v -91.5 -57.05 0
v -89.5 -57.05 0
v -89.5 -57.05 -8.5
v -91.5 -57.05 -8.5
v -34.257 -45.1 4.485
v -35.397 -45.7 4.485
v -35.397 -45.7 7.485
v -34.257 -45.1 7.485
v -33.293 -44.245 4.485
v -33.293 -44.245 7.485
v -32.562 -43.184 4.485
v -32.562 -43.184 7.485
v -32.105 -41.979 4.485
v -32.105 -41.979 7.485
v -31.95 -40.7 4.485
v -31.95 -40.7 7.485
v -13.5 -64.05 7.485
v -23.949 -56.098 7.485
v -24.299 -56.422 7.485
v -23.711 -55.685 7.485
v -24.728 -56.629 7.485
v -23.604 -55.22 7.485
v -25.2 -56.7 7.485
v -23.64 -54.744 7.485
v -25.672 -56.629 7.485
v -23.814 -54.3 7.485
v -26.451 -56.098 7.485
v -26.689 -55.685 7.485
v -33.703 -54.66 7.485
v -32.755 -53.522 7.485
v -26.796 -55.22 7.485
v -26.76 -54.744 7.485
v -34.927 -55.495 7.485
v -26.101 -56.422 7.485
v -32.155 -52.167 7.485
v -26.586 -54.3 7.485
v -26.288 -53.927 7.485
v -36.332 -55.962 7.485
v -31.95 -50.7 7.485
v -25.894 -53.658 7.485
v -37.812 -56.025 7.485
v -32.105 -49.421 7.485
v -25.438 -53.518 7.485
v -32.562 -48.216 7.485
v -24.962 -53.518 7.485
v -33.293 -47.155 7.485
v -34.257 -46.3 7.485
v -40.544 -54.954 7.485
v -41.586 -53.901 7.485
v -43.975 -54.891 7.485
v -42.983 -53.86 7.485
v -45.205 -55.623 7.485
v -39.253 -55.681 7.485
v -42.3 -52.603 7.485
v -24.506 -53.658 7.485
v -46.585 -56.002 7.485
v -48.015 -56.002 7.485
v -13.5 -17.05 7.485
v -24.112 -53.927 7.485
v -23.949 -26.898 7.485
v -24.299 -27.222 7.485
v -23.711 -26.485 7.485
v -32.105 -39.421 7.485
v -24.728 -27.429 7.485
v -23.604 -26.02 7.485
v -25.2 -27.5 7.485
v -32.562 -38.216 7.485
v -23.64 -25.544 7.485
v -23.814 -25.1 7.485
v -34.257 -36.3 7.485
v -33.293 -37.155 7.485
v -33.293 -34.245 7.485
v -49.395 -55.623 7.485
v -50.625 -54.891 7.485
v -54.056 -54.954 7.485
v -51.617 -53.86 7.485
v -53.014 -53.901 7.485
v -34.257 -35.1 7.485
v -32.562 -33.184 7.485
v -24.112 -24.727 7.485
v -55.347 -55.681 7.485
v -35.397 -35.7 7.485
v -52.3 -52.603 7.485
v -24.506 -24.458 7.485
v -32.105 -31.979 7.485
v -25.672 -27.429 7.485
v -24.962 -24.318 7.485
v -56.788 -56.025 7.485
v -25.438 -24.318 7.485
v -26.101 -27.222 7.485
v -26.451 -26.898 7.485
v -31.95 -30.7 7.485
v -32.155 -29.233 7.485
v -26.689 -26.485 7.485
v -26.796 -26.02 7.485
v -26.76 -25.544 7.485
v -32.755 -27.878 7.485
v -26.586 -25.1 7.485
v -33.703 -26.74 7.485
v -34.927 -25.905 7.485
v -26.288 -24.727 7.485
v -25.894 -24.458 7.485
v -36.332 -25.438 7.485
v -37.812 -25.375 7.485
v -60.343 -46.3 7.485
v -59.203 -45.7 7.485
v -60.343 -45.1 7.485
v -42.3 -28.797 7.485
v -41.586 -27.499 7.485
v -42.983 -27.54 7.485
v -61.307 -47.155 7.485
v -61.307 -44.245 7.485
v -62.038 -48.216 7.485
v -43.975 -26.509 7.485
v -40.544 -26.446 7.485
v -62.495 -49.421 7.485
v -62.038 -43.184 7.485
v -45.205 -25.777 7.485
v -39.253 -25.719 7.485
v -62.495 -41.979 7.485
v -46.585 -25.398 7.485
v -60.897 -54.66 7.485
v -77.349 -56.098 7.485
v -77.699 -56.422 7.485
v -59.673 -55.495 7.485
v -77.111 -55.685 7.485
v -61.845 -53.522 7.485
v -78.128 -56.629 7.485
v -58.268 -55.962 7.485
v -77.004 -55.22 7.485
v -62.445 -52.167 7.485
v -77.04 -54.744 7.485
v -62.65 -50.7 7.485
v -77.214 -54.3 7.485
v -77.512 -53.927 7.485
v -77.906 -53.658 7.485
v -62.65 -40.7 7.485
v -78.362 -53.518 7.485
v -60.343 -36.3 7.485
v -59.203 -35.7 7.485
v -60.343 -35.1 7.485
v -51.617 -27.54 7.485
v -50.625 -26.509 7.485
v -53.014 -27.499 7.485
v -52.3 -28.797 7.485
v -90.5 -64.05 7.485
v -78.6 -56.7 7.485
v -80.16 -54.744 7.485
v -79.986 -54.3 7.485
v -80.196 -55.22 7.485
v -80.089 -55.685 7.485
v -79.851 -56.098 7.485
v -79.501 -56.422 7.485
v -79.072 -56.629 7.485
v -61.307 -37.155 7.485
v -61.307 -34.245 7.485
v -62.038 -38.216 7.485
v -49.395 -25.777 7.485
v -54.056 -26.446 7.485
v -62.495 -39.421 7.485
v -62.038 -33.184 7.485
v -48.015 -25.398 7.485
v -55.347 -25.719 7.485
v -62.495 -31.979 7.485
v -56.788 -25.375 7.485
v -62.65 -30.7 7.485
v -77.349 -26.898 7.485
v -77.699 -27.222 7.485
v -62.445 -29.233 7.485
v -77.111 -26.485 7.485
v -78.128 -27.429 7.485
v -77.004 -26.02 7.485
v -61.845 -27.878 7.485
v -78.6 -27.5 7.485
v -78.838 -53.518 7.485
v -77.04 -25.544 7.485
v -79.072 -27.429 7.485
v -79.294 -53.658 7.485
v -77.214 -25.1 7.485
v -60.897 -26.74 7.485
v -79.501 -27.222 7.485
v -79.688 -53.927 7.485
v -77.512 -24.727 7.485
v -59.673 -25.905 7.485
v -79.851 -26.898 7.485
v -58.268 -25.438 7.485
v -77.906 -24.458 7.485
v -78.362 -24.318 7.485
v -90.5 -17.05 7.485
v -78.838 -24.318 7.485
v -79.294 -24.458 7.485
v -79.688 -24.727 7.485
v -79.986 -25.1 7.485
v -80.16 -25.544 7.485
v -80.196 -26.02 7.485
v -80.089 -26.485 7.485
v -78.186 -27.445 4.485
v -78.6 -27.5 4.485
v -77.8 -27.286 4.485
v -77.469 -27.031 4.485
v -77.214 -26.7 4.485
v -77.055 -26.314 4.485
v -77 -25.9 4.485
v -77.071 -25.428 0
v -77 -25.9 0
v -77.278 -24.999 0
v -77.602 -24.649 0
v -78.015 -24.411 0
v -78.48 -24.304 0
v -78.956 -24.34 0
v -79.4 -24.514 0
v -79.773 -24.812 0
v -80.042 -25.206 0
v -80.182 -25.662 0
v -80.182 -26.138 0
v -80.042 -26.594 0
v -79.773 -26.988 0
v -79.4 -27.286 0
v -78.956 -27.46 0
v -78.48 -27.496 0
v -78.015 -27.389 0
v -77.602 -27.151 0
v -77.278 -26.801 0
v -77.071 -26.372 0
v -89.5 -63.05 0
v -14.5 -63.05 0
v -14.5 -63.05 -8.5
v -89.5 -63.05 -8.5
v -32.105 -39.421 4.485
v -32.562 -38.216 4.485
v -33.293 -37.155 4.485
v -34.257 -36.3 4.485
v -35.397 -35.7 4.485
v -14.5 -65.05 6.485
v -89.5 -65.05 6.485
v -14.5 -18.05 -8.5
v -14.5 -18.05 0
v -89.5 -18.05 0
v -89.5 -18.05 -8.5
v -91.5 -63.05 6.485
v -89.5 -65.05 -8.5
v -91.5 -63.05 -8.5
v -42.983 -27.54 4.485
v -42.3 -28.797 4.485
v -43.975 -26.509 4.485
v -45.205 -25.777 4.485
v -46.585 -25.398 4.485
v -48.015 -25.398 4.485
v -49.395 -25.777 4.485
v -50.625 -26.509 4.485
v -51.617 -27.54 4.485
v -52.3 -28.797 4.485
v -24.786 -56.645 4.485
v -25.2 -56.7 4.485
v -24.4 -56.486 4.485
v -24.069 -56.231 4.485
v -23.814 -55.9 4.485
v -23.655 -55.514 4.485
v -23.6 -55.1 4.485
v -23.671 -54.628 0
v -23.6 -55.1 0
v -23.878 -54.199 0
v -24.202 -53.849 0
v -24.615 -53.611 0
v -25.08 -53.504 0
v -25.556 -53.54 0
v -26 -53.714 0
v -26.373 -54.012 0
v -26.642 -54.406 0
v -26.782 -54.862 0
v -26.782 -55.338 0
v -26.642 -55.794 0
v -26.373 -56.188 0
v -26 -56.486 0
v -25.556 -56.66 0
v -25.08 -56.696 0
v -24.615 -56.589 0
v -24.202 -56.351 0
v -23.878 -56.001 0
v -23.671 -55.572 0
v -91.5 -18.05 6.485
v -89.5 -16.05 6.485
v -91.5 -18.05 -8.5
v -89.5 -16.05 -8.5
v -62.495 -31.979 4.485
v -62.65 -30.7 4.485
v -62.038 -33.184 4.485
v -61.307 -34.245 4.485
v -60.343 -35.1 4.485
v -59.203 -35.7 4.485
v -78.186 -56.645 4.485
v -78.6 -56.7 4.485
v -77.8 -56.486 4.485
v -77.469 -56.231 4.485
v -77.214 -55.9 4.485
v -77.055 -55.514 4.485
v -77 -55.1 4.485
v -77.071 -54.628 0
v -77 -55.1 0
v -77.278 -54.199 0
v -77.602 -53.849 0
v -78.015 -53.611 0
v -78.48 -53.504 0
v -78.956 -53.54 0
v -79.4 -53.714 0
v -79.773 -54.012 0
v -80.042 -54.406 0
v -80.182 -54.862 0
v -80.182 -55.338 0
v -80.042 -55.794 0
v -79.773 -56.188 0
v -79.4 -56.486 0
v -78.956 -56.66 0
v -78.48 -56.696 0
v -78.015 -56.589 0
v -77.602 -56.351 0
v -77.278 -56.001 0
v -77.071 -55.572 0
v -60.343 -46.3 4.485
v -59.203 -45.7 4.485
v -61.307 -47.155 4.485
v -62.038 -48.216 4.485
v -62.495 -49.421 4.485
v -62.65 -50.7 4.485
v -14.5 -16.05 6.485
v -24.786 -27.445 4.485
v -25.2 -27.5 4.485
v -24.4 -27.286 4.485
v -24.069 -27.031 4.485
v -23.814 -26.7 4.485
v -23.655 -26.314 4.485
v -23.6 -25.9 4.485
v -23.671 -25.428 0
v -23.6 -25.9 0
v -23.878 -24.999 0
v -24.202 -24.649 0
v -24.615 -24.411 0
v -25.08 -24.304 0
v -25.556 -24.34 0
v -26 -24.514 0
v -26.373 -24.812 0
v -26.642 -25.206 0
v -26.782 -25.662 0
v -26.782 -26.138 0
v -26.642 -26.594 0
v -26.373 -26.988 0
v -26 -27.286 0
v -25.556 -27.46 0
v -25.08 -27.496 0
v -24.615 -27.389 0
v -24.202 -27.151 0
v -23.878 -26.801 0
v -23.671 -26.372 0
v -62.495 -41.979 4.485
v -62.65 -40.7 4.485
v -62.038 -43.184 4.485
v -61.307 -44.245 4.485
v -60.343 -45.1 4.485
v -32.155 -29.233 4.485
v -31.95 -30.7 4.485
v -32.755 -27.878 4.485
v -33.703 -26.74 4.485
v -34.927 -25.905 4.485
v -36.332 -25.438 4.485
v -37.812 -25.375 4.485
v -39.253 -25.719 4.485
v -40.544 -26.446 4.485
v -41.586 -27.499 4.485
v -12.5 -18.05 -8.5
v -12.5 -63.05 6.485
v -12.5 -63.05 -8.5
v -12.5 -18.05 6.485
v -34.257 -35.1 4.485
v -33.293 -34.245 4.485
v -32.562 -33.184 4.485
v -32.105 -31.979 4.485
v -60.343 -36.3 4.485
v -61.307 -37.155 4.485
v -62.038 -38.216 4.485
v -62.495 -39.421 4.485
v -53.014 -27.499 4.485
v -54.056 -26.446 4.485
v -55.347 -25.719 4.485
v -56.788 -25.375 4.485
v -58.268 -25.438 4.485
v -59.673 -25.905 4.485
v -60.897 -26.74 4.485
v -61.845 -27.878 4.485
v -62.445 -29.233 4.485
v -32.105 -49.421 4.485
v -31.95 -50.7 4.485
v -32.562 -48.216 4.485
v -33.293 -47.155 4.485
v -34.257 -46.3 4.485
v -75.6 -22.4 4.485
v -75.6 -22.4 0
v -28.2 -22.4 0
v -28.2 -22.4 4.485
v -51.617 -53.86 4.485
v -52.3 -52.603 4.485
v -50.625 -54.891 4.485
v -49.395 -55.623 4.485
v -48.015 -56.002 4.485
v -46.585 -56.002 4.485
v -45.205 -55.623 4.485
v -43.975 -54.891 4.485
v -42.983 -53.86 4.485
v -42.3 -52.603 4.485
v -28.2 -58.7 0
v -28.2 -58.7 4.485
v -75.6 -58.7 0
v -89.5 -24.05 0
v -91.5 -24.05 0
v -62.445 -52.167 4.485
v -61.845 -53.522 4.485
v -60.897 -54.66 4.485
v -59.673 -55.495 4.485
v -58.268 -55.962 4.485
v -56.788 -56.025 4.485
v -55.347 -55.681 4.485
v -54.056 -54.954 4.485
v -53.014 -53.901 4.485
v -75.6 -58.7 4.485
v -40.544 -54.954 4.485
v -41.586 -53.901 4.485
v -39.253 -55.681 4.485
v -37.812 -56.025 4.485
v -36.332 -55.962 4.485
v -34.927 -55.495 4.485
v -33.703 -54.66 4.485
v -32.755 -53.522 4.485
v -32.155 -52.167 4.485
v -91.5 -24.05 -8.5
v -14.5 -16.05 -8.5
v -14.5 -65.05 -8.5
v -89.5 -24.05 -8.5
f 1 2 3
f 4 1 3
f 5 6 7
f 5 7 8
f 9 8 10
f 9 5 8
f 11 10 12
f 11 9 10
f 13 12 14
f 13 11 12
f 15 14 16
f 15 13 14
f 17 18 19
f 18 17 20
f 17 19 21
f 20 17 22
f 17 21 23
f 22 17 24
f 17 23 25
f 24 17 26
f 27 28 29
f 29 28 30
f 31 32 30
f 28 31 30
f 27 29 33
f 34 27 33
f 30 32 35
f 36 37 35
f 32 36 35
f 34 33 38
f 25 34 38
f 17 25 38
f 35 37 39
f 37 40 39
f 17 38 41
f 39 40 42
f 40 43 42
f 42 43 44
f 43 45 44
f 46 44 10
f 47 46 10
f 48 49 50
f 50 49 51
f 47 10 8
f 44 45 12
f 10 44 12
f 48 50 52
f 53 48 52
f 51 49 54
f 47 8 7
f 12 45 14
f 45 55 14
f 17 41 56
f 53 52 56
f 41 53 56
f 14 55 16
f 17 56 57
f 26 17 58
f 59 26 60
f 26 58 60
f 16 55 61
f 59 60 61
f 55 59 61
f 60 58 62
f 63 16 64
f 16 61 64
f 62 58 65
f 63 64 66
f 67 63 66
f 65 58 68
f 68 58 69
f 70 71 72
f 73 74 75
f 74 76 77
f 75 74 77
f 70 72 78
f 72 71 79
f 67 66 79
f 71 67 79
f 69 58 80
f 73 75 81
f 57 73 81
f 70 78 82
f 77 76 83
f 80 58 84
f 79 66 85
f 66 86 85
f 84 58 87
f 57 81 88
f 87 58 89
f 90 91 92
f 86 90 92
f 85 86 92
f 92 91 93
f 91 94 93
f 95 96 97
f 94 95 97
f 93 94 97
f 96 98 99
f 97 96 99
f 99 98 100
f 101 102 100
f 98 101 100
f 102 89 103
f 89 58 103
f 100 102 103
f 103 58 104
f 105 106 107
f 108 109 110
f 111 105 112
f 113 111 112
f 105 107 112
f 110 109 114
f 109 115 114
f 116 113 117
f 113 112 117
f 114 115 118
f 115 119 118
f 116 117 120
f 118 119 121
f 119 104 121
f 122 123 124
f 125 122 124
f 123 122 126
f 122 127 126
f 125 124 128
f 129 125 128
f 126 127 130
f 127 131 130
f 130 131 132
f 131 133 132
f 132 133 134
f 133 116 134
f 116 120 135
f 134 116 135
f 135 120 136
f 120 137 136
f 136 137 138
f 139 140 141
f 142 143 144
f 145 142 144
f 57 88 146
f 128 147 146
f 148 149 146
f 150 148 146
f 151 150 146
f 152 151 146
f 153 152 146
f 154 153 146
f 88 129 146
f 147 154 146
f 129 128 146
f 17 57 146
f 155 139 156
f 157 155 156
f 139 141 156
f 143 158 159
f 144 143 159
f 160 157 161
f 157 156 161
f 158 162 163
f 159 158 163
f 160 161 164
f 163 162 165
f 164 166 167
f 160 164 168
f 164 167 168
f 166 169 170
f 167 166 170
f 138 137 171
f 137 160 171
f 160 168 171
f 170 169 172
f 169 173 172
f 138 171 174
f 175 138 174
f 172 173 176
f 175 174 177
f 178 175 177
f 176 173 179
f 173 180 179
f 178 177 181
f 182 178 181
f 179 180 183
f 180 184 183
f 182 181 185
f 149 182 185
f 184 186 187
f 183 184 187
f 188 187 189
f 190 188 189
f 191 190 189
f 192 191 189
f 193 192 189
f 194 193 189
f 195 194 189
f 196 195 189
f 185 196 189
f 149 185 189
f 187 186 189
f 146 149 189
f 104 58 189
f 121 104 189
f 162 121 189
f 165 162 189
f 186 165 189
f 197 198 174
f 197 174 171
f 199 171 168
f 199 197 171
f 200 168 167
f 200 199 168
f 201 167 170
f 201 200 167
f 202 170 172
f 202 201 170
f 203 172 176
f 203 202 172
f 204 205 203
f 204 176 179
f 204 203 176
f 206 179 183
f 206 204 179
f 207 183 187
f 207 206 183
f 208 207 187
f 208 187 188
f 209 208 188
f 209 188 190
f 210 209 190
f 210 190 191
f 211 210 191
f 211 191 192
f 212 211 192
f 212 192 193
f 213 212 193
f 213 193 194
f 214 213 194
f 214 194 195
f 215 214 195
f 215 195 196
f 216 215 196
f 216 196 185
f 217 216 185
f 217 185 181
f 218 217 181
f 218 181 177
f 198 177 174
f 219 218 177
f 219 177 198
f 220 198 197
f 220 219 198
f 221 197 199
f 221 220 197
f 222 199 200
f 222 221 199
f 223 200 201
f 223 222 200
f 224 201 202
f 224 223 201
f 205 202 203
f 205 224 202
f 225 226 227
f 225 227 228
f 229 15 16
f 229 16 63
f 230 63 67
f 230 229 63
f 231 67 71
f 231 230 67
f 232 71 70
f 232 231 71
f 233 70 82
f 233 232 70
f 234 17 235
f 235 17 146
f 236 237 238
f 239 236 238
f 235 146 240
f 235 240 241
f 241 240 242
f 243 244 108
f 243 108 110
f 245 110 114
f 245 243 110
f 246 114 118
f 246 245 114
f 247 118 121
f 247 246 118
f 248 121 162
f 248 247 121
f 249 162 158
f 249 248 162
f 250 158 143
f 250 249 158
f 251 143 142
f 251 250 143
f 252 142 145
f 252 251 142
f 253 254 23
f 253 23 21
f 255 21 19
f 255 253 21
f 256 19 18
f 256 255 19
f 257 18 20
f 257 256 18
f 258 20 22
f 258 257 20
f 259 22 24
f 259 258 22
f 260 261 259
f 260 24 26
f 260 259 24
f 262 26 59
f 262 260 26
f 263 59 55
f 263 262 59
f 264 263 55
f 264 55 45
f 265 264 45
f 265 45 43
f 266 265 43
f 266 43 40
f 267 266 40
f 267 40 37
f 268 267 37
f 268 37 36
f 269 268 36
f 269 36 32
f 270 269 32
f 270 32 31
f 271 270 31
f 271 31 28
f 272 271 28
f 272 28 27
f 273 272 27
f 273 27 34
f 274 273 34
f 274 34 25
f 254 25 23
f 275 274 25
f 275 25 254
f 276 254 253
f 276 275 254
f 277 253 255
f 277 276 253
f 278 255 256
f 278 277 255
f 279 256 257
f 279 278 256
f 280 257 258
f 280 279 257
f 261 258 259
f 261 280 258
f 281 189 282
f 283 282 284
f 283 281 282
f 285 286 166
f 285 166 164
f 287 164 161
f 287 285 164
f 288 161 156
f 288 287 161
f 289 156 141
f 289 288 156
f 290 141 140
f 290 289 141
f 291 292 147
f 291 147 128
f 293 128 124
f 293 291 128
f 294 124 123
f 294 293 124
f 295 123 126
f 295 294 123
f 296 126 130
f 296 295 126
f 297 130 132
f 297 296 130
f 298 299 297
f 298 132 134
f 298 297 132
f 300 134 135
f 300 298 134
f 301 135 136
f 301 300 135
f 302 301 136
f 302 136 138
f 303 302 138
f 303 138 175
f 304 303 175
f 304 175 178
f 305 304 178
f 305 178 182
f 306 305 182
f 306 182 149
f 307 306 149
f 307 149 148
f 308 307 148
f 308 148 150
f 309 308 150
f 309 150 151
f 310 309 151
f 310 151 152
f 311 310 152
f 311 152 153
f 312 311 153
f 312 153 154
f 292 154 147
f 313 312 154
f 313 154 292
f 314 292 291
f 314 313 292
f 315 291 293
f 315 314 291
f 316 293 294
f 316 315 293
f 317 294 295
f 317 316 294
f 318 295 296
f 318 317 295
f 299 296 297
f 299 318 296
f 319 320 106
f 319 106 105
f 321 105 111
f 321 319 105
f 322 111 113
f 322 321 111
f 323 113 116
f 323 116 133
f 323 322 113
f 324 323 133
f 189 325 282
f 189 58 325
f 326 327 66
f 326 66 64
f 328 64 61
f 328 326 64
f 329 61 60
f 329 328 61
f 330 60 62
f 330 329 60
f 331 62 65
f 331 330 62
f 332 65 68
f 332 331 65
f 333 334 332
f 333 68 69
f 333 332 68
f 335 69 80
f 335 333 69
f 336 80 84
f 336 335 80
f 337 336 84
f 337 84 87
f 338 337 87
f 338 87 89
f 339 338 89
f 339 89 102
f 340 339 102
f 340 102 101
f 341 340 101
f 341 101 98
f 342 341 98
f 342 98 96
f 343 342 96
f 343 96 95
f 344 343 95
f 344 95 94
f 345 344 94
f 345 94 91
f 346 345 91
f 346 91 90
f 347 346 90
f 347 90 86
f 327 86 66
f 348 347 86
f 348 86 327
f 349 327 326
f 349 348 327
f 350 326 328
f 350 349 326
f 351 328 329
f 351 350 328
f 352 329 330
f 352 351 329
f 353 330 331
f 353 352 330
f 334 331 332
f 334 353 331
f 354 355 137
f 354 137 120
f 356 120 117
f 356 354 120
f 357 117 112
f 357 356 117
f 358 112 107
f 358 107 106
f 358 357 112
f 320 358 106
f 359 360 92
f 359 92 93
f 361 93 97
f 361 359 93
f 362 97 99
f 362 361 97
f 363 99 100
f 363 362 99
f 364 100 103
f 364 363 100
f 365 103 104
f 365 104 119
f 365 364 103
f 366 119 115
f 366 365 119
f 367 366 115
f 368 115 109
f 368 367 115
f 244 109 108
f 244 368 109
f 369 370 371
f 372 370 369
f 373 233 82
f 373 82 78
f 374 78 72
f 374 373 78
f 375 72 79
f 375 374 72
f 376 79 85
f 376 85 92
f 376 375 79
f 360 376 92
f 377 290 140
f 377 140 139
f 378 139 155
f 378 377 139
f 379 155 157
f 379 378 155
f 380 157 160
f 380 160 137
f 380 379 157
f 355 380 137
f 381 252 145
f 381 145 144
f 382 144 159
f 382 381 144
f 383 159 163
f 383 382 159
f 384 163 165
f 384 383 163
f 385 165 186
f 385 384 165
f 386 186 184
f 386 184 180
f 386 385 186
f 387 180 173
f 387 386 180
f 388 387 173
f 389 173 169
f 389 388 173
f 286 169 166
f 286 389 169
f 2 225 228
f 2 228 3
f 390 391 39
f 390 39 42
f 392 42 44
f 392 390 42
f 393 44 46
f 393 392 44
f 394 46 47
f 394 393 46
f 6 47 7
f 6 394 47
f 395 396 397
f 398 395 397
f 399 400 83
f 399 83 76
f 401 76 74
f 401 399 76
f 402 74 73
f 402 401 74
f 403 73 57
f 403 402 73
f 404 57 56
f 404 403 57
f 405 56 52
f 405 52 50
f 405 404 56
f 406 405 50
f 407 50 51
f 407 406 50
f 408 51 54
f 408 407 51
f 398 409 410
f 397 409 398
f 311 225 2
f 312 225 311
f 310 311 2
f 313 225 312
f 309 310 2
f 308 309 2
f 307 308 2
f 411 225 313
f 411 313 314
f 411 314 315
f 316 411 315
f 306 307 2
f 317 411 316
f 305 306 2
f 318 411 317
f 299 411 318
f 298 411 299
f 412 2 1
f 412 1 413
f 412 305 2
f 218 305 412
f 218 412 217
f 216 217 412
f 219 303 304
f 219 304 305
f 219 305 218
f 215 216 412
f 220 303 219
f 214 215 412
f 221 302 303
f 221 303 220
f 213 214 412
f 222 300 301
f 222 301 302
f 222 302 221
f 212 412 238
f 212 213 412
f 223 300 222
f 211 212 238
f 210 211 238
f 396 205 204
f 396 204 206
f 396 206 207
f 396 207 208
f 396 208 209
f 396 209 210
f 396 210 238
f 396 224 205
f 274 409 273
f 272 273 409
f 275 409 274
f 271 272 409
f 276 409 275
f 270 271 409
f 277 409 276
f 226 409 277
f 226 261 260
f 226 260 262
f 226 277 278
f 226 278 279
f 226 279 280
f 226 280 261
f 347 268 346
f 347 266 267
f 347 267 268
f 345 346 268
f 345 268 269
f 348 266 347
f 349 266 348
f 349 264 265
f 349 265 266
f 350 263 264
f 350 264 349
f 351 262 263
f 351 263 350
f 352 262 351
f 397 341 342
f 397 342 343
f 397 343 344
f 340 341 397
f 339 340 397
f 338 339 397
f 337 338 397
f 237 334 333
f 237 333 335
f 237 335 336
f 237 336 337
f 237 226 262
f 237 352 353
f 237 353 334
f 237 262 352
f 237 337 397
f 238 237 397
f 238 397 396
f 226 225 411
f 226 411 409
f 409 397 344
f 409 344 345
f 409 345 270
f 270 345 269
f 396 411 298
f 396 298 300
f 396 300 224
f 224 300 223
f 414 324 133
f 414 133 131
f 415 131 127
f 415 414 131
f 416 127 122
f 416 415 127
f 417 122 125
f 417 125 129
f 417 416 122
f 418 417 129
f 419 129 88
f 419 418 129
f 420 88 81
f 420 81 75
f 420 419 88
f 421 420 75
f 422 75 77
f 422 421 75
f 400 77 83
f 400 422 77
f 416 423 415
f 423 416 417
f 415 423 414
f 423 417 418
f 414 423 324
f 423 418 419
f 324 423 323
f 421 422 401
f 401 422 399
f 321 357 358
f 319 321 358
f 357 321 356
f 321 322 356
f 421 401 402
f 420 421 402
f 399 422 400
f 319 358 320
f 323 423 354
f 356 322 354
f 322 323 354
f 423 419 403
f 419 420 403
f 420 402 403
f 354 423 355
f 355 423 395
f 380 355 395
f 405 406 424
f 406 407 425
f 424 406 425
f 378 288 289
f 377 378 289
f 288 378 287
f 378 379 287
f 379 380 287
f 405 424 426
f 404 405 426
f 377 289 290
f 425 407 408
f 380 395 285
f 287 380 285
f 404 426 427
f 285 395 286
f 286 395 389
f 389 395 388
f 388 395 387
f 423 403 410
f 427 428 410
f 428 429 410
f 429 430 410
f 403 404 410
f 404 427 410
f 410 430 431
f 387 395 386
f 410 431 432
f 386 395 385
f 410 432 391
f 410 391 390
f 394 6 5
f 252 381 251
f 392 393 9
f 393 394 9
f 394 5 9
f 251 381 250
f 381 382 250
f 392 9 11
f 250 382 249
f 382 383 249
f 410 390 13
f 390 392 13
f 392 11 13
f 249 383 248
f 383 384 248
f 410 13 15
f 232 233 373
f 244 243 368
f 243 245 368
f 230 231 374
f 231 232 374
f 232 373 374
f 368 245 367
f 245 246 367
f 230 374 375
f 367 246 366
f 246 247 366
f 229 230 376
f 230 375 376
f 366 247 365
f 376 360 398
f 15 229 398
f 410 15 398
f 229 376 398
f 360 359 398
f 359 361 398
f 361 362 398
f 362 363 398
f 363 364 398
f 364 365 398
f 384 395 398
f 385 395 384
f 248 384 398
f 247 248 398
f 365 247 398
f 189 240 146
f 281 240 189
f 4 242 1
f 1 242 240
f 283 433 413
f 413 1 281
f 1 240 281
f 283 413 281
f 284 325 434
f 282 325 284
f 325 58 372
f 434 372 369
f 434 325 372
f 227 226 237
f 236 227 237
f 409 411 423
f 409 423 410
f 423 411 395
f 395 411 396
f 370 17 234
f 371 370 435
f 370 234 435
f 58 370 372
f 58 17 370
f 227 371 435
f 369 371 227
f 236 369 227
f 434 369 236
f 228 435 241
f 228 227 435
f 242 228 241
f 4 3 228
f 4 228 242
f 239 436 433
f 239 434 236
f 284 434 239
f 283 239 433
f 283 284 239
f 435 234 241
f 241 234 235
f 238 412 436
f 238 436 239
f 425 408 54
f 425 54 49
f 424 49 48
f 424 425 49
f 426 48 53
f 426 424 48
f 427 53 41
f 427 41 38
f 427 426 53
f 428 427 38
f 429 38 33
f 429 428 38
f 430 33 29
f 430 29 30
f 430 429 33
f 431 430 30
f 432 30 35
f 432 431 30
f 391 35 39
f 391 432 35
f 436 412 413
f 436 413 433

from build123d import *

# Parameters (mm, degrees)
BOSS_EXTRUDE1_START      = 4.485
SKETCH1_W                = 75
SKETCH1_H                = 45
SKETCH1_R                = 1.6
SKETCH1_W_2              = 47.4
SKETCH1_H_2              = 36.3
BOSS_EXTRUDE1_DEPTH      = 3
SKETCH1_4_W              = 75
SKETCH1_4_H              = 45
SKETCH1_4_R              = 1.6
SKETCH1_4_W_2            = 47.4
SKETCH1_4_H_2            = 36.3
BOSS_EXTRUDE2_DEPTH      = 4.485
BOSS_EXTRUDE3_DEPTH      = 8.5
BOSS_EXTRUDE3_DEPTH_BACK = 7.485
SKETCH2_W                = 79
SKETCH2_H                = 49
SKETCH2_W_2              = 75
SKETCH2_H_2              = 45
SKETCH4_W                = 8.5
SKETCH4_H                = 33
CUT_EXTRUDE1_DEPTH       = 52
CHAMFER1_SIZE            = 1
CHAMFER2_SIZE            = 2


with BuildPart() as part:
    # Sketch1 → Boss-Extrude1 (new body)
    # profile 1 of 2: a face of its own
    with BuildSketch(Plane.XY.offset(BOSS_EXTRUDE1_START)):
        with Locations((-52, -40.55)):
            Rectangle(SKETCH1_W, SKETCH1_H)
        with Locations(Location((-78.6, -55.1, 0), (0, 0, 270))):
            Circle(SKETCH1_R, mode=Mode.SUBTRACT)
        with Locations(Location((-78.6, -25.9, 0), (0, 0, 270))):
            Circle(SKETCH1_R, mode=Mode.SUBTRACT)
        with Locations(Location((-25.2, -25.9, 0), (0, 0, 270))):
            Circle(SKETCH1_R, mode=Mode.SUBTRACT)
        with Locations(Location((-25.2, -55.1, 0), (0, 0, 270))):
            Circle(SKETCH1_R, mode=Mode.SUBTRACT)
        with Locations((-51.9, -40.55)):
            Rectangle(SKETCH1_W_2, SKETCH1_H_2, mode=Mode.SUBTRACT)
    # profile 2 of 2: a face of its own
    with BuildSketch(Plane.XY.offset(BOSS_EXTRUDE1_START)):
        with Locations((-51.9, -40.55)):
            Rectangle(SKETCH1_W_2, SKETCH1_H_2)
        with BuildLine():
            ThreePointArc((-35.396713369, -35.7), (-32.895168364, -33.736438417), (-31.95, -30.7))
            ThreePointArc((-31.95, -30.7), (-36.332399876, -25.438227485), (-42.3, -28.796713369))
            ThreePointArc((-42.3, -28.796713369), (-47.3, -25.35), (-52.3, -28.796713369))
            ThreePointArc((-52.3, -28.796713369), (-58.267600124, -25.438227485), (-62.65, -30.7))
            ThreePointArc((-62.65, -30.7), (-61.704831636, -33.736438417), (-59.203286631, -35.7))
            ThreePointArc((-59.203286631, -35.7), (-61.704831636, -37.663561583), (-62.65, -40.7))
            ThreePointArc((-62.65, -40.7), (-61.704831636, -43.736438417), (-59.203286631, -45.7))
            ThreePointArc((-59.203286631, -45.7), (-61.704831636, -47.663561583), (-62.65, -50.7))
            ThreePointArc((-62.65, -50.7), (-58.267600124, -55.961772515), (-52.3, -52.603286631))
            ThreePointArc((-52.3, -52.603286631), (-47.3, -56.05), (-42.3, -52.603286631))
            ThreePointArc((-42.3, -52.603286631), (-36.332399876, -55.961772515), (-31.95, -50.7))
            ThreePointArc((-31.95, -50.7), (-32.895168364, -47.663561583), (-35.396713369, -45.7))
            ThreePointArc((-35.396713369, -45.7), (-32.895168364, -43.736438417), (-31.95, -40.7))
            ThreePointArc((-31.95, -40.7), (-32.895168364, -37.663561583), (-35.396713369, -35.7))
        make_face(mode=Mode.SUBTRACT)
    extrude(amount=BOSS_EXTRUDE1_DEPTH)

    # Sketch1<4> → Boss-Extrude2 (add)
    with BuildSketch(Plane.XY):
        with Locations((-52, -40.55)):
            Rectangle(SKETCH1_4_W, SKETCH1_4_H)
        with Locations((-78.6, -55.1)):
            Circle(SKETCH1_4_R, mode=Mode.SUBTRACT)
        with Locations((-78.6, -25.9)):
            Circle(SKETCH1_4_R, mode=Mode.SUBTRACT)
        with Locations((-25.2, -25.9)):
            Circle(SKETCH1_4_R, mode=Mode.SUBTRACT)
        with Locations((-25.2, -55.1)):
            Circle(SKETCH1_4_R, mode=Mode.SUBTRACT)
        with Locations((-51.9, -40.55)):
            Rectangle(SKETCH1_4_W_2, SKETCH1_4_H_2, mode=Mode.SUBTRACT)
    extrude(amount=BOSS_EXTRUDE2_DEPTH)

    # Sketch2 → Boss-Extrude3 (add, two sides: drawn at the far end of the back side and taken through both)
    with BuildSketch(Plane(origin=(0, 0, 0), x_dir=(-1, 0, 0), z_dir=(0, 0, -1)).offset(-BOSS_EXTRUDE3_DEPTH_BACK)):
        with Locations((52, -40.55)):
            Rectangle(SKETCH2_W, SKETCH2_H)
        with Locations((52, -40.55)):
            Rectangle(SKETCH2_W_2, SKETCH2_H_2, mode=Mode.SUBTRACT)
    extrude(amount=BOSS_EXTRUDE3_DEPTH + BOSS_EXTRUDE3_DEPTH_BACK)

    # Sketch4 → Cut-Extrude1 (cut)
    with BuildSketch(Plane(origin=(-89.5, 0, 0), x_dir=(0, 0, -1), z_dir=(1, 0, 0))):
        with Locations((4.25, -40.55)):
            Rectangle(SKETCH4_W, SKETCH4_H)
    extrude(amount=-CUT_EXTRUDE1_DEPTH, mode=Mode.SUBTRACT)

    # Chamfer1
    chamfer1_edges = [part.edges().sort_by_distance(p)[0] for p in [
        (-52, -65.05, 7.485),
        (-91.5, -40.55, 7.485),
        (-52, -16.05, 7.485),
        (-12.5, -40.55, 7.485),
    ]]
    chamfer(chamfer1_edges, length=CHAMFER1_SIZE)

    # Chamfer2
    chamfer2_edges = [part.edges().sort_by_distance(p)[0] for p in [
        (-12.5, -65.05, -1.0075),
        (-91.5, -65.05, -1.0075),
        (-12.5, -16.05, -1.0075),
        (-91.5, -16.05, -1.0075),
    ]]
    chamfer(chamfer2_edges, length=CHAMFER2_SIZE - 0.0001)  # a hair under: the kernel refuses the full size


solid = part.part
